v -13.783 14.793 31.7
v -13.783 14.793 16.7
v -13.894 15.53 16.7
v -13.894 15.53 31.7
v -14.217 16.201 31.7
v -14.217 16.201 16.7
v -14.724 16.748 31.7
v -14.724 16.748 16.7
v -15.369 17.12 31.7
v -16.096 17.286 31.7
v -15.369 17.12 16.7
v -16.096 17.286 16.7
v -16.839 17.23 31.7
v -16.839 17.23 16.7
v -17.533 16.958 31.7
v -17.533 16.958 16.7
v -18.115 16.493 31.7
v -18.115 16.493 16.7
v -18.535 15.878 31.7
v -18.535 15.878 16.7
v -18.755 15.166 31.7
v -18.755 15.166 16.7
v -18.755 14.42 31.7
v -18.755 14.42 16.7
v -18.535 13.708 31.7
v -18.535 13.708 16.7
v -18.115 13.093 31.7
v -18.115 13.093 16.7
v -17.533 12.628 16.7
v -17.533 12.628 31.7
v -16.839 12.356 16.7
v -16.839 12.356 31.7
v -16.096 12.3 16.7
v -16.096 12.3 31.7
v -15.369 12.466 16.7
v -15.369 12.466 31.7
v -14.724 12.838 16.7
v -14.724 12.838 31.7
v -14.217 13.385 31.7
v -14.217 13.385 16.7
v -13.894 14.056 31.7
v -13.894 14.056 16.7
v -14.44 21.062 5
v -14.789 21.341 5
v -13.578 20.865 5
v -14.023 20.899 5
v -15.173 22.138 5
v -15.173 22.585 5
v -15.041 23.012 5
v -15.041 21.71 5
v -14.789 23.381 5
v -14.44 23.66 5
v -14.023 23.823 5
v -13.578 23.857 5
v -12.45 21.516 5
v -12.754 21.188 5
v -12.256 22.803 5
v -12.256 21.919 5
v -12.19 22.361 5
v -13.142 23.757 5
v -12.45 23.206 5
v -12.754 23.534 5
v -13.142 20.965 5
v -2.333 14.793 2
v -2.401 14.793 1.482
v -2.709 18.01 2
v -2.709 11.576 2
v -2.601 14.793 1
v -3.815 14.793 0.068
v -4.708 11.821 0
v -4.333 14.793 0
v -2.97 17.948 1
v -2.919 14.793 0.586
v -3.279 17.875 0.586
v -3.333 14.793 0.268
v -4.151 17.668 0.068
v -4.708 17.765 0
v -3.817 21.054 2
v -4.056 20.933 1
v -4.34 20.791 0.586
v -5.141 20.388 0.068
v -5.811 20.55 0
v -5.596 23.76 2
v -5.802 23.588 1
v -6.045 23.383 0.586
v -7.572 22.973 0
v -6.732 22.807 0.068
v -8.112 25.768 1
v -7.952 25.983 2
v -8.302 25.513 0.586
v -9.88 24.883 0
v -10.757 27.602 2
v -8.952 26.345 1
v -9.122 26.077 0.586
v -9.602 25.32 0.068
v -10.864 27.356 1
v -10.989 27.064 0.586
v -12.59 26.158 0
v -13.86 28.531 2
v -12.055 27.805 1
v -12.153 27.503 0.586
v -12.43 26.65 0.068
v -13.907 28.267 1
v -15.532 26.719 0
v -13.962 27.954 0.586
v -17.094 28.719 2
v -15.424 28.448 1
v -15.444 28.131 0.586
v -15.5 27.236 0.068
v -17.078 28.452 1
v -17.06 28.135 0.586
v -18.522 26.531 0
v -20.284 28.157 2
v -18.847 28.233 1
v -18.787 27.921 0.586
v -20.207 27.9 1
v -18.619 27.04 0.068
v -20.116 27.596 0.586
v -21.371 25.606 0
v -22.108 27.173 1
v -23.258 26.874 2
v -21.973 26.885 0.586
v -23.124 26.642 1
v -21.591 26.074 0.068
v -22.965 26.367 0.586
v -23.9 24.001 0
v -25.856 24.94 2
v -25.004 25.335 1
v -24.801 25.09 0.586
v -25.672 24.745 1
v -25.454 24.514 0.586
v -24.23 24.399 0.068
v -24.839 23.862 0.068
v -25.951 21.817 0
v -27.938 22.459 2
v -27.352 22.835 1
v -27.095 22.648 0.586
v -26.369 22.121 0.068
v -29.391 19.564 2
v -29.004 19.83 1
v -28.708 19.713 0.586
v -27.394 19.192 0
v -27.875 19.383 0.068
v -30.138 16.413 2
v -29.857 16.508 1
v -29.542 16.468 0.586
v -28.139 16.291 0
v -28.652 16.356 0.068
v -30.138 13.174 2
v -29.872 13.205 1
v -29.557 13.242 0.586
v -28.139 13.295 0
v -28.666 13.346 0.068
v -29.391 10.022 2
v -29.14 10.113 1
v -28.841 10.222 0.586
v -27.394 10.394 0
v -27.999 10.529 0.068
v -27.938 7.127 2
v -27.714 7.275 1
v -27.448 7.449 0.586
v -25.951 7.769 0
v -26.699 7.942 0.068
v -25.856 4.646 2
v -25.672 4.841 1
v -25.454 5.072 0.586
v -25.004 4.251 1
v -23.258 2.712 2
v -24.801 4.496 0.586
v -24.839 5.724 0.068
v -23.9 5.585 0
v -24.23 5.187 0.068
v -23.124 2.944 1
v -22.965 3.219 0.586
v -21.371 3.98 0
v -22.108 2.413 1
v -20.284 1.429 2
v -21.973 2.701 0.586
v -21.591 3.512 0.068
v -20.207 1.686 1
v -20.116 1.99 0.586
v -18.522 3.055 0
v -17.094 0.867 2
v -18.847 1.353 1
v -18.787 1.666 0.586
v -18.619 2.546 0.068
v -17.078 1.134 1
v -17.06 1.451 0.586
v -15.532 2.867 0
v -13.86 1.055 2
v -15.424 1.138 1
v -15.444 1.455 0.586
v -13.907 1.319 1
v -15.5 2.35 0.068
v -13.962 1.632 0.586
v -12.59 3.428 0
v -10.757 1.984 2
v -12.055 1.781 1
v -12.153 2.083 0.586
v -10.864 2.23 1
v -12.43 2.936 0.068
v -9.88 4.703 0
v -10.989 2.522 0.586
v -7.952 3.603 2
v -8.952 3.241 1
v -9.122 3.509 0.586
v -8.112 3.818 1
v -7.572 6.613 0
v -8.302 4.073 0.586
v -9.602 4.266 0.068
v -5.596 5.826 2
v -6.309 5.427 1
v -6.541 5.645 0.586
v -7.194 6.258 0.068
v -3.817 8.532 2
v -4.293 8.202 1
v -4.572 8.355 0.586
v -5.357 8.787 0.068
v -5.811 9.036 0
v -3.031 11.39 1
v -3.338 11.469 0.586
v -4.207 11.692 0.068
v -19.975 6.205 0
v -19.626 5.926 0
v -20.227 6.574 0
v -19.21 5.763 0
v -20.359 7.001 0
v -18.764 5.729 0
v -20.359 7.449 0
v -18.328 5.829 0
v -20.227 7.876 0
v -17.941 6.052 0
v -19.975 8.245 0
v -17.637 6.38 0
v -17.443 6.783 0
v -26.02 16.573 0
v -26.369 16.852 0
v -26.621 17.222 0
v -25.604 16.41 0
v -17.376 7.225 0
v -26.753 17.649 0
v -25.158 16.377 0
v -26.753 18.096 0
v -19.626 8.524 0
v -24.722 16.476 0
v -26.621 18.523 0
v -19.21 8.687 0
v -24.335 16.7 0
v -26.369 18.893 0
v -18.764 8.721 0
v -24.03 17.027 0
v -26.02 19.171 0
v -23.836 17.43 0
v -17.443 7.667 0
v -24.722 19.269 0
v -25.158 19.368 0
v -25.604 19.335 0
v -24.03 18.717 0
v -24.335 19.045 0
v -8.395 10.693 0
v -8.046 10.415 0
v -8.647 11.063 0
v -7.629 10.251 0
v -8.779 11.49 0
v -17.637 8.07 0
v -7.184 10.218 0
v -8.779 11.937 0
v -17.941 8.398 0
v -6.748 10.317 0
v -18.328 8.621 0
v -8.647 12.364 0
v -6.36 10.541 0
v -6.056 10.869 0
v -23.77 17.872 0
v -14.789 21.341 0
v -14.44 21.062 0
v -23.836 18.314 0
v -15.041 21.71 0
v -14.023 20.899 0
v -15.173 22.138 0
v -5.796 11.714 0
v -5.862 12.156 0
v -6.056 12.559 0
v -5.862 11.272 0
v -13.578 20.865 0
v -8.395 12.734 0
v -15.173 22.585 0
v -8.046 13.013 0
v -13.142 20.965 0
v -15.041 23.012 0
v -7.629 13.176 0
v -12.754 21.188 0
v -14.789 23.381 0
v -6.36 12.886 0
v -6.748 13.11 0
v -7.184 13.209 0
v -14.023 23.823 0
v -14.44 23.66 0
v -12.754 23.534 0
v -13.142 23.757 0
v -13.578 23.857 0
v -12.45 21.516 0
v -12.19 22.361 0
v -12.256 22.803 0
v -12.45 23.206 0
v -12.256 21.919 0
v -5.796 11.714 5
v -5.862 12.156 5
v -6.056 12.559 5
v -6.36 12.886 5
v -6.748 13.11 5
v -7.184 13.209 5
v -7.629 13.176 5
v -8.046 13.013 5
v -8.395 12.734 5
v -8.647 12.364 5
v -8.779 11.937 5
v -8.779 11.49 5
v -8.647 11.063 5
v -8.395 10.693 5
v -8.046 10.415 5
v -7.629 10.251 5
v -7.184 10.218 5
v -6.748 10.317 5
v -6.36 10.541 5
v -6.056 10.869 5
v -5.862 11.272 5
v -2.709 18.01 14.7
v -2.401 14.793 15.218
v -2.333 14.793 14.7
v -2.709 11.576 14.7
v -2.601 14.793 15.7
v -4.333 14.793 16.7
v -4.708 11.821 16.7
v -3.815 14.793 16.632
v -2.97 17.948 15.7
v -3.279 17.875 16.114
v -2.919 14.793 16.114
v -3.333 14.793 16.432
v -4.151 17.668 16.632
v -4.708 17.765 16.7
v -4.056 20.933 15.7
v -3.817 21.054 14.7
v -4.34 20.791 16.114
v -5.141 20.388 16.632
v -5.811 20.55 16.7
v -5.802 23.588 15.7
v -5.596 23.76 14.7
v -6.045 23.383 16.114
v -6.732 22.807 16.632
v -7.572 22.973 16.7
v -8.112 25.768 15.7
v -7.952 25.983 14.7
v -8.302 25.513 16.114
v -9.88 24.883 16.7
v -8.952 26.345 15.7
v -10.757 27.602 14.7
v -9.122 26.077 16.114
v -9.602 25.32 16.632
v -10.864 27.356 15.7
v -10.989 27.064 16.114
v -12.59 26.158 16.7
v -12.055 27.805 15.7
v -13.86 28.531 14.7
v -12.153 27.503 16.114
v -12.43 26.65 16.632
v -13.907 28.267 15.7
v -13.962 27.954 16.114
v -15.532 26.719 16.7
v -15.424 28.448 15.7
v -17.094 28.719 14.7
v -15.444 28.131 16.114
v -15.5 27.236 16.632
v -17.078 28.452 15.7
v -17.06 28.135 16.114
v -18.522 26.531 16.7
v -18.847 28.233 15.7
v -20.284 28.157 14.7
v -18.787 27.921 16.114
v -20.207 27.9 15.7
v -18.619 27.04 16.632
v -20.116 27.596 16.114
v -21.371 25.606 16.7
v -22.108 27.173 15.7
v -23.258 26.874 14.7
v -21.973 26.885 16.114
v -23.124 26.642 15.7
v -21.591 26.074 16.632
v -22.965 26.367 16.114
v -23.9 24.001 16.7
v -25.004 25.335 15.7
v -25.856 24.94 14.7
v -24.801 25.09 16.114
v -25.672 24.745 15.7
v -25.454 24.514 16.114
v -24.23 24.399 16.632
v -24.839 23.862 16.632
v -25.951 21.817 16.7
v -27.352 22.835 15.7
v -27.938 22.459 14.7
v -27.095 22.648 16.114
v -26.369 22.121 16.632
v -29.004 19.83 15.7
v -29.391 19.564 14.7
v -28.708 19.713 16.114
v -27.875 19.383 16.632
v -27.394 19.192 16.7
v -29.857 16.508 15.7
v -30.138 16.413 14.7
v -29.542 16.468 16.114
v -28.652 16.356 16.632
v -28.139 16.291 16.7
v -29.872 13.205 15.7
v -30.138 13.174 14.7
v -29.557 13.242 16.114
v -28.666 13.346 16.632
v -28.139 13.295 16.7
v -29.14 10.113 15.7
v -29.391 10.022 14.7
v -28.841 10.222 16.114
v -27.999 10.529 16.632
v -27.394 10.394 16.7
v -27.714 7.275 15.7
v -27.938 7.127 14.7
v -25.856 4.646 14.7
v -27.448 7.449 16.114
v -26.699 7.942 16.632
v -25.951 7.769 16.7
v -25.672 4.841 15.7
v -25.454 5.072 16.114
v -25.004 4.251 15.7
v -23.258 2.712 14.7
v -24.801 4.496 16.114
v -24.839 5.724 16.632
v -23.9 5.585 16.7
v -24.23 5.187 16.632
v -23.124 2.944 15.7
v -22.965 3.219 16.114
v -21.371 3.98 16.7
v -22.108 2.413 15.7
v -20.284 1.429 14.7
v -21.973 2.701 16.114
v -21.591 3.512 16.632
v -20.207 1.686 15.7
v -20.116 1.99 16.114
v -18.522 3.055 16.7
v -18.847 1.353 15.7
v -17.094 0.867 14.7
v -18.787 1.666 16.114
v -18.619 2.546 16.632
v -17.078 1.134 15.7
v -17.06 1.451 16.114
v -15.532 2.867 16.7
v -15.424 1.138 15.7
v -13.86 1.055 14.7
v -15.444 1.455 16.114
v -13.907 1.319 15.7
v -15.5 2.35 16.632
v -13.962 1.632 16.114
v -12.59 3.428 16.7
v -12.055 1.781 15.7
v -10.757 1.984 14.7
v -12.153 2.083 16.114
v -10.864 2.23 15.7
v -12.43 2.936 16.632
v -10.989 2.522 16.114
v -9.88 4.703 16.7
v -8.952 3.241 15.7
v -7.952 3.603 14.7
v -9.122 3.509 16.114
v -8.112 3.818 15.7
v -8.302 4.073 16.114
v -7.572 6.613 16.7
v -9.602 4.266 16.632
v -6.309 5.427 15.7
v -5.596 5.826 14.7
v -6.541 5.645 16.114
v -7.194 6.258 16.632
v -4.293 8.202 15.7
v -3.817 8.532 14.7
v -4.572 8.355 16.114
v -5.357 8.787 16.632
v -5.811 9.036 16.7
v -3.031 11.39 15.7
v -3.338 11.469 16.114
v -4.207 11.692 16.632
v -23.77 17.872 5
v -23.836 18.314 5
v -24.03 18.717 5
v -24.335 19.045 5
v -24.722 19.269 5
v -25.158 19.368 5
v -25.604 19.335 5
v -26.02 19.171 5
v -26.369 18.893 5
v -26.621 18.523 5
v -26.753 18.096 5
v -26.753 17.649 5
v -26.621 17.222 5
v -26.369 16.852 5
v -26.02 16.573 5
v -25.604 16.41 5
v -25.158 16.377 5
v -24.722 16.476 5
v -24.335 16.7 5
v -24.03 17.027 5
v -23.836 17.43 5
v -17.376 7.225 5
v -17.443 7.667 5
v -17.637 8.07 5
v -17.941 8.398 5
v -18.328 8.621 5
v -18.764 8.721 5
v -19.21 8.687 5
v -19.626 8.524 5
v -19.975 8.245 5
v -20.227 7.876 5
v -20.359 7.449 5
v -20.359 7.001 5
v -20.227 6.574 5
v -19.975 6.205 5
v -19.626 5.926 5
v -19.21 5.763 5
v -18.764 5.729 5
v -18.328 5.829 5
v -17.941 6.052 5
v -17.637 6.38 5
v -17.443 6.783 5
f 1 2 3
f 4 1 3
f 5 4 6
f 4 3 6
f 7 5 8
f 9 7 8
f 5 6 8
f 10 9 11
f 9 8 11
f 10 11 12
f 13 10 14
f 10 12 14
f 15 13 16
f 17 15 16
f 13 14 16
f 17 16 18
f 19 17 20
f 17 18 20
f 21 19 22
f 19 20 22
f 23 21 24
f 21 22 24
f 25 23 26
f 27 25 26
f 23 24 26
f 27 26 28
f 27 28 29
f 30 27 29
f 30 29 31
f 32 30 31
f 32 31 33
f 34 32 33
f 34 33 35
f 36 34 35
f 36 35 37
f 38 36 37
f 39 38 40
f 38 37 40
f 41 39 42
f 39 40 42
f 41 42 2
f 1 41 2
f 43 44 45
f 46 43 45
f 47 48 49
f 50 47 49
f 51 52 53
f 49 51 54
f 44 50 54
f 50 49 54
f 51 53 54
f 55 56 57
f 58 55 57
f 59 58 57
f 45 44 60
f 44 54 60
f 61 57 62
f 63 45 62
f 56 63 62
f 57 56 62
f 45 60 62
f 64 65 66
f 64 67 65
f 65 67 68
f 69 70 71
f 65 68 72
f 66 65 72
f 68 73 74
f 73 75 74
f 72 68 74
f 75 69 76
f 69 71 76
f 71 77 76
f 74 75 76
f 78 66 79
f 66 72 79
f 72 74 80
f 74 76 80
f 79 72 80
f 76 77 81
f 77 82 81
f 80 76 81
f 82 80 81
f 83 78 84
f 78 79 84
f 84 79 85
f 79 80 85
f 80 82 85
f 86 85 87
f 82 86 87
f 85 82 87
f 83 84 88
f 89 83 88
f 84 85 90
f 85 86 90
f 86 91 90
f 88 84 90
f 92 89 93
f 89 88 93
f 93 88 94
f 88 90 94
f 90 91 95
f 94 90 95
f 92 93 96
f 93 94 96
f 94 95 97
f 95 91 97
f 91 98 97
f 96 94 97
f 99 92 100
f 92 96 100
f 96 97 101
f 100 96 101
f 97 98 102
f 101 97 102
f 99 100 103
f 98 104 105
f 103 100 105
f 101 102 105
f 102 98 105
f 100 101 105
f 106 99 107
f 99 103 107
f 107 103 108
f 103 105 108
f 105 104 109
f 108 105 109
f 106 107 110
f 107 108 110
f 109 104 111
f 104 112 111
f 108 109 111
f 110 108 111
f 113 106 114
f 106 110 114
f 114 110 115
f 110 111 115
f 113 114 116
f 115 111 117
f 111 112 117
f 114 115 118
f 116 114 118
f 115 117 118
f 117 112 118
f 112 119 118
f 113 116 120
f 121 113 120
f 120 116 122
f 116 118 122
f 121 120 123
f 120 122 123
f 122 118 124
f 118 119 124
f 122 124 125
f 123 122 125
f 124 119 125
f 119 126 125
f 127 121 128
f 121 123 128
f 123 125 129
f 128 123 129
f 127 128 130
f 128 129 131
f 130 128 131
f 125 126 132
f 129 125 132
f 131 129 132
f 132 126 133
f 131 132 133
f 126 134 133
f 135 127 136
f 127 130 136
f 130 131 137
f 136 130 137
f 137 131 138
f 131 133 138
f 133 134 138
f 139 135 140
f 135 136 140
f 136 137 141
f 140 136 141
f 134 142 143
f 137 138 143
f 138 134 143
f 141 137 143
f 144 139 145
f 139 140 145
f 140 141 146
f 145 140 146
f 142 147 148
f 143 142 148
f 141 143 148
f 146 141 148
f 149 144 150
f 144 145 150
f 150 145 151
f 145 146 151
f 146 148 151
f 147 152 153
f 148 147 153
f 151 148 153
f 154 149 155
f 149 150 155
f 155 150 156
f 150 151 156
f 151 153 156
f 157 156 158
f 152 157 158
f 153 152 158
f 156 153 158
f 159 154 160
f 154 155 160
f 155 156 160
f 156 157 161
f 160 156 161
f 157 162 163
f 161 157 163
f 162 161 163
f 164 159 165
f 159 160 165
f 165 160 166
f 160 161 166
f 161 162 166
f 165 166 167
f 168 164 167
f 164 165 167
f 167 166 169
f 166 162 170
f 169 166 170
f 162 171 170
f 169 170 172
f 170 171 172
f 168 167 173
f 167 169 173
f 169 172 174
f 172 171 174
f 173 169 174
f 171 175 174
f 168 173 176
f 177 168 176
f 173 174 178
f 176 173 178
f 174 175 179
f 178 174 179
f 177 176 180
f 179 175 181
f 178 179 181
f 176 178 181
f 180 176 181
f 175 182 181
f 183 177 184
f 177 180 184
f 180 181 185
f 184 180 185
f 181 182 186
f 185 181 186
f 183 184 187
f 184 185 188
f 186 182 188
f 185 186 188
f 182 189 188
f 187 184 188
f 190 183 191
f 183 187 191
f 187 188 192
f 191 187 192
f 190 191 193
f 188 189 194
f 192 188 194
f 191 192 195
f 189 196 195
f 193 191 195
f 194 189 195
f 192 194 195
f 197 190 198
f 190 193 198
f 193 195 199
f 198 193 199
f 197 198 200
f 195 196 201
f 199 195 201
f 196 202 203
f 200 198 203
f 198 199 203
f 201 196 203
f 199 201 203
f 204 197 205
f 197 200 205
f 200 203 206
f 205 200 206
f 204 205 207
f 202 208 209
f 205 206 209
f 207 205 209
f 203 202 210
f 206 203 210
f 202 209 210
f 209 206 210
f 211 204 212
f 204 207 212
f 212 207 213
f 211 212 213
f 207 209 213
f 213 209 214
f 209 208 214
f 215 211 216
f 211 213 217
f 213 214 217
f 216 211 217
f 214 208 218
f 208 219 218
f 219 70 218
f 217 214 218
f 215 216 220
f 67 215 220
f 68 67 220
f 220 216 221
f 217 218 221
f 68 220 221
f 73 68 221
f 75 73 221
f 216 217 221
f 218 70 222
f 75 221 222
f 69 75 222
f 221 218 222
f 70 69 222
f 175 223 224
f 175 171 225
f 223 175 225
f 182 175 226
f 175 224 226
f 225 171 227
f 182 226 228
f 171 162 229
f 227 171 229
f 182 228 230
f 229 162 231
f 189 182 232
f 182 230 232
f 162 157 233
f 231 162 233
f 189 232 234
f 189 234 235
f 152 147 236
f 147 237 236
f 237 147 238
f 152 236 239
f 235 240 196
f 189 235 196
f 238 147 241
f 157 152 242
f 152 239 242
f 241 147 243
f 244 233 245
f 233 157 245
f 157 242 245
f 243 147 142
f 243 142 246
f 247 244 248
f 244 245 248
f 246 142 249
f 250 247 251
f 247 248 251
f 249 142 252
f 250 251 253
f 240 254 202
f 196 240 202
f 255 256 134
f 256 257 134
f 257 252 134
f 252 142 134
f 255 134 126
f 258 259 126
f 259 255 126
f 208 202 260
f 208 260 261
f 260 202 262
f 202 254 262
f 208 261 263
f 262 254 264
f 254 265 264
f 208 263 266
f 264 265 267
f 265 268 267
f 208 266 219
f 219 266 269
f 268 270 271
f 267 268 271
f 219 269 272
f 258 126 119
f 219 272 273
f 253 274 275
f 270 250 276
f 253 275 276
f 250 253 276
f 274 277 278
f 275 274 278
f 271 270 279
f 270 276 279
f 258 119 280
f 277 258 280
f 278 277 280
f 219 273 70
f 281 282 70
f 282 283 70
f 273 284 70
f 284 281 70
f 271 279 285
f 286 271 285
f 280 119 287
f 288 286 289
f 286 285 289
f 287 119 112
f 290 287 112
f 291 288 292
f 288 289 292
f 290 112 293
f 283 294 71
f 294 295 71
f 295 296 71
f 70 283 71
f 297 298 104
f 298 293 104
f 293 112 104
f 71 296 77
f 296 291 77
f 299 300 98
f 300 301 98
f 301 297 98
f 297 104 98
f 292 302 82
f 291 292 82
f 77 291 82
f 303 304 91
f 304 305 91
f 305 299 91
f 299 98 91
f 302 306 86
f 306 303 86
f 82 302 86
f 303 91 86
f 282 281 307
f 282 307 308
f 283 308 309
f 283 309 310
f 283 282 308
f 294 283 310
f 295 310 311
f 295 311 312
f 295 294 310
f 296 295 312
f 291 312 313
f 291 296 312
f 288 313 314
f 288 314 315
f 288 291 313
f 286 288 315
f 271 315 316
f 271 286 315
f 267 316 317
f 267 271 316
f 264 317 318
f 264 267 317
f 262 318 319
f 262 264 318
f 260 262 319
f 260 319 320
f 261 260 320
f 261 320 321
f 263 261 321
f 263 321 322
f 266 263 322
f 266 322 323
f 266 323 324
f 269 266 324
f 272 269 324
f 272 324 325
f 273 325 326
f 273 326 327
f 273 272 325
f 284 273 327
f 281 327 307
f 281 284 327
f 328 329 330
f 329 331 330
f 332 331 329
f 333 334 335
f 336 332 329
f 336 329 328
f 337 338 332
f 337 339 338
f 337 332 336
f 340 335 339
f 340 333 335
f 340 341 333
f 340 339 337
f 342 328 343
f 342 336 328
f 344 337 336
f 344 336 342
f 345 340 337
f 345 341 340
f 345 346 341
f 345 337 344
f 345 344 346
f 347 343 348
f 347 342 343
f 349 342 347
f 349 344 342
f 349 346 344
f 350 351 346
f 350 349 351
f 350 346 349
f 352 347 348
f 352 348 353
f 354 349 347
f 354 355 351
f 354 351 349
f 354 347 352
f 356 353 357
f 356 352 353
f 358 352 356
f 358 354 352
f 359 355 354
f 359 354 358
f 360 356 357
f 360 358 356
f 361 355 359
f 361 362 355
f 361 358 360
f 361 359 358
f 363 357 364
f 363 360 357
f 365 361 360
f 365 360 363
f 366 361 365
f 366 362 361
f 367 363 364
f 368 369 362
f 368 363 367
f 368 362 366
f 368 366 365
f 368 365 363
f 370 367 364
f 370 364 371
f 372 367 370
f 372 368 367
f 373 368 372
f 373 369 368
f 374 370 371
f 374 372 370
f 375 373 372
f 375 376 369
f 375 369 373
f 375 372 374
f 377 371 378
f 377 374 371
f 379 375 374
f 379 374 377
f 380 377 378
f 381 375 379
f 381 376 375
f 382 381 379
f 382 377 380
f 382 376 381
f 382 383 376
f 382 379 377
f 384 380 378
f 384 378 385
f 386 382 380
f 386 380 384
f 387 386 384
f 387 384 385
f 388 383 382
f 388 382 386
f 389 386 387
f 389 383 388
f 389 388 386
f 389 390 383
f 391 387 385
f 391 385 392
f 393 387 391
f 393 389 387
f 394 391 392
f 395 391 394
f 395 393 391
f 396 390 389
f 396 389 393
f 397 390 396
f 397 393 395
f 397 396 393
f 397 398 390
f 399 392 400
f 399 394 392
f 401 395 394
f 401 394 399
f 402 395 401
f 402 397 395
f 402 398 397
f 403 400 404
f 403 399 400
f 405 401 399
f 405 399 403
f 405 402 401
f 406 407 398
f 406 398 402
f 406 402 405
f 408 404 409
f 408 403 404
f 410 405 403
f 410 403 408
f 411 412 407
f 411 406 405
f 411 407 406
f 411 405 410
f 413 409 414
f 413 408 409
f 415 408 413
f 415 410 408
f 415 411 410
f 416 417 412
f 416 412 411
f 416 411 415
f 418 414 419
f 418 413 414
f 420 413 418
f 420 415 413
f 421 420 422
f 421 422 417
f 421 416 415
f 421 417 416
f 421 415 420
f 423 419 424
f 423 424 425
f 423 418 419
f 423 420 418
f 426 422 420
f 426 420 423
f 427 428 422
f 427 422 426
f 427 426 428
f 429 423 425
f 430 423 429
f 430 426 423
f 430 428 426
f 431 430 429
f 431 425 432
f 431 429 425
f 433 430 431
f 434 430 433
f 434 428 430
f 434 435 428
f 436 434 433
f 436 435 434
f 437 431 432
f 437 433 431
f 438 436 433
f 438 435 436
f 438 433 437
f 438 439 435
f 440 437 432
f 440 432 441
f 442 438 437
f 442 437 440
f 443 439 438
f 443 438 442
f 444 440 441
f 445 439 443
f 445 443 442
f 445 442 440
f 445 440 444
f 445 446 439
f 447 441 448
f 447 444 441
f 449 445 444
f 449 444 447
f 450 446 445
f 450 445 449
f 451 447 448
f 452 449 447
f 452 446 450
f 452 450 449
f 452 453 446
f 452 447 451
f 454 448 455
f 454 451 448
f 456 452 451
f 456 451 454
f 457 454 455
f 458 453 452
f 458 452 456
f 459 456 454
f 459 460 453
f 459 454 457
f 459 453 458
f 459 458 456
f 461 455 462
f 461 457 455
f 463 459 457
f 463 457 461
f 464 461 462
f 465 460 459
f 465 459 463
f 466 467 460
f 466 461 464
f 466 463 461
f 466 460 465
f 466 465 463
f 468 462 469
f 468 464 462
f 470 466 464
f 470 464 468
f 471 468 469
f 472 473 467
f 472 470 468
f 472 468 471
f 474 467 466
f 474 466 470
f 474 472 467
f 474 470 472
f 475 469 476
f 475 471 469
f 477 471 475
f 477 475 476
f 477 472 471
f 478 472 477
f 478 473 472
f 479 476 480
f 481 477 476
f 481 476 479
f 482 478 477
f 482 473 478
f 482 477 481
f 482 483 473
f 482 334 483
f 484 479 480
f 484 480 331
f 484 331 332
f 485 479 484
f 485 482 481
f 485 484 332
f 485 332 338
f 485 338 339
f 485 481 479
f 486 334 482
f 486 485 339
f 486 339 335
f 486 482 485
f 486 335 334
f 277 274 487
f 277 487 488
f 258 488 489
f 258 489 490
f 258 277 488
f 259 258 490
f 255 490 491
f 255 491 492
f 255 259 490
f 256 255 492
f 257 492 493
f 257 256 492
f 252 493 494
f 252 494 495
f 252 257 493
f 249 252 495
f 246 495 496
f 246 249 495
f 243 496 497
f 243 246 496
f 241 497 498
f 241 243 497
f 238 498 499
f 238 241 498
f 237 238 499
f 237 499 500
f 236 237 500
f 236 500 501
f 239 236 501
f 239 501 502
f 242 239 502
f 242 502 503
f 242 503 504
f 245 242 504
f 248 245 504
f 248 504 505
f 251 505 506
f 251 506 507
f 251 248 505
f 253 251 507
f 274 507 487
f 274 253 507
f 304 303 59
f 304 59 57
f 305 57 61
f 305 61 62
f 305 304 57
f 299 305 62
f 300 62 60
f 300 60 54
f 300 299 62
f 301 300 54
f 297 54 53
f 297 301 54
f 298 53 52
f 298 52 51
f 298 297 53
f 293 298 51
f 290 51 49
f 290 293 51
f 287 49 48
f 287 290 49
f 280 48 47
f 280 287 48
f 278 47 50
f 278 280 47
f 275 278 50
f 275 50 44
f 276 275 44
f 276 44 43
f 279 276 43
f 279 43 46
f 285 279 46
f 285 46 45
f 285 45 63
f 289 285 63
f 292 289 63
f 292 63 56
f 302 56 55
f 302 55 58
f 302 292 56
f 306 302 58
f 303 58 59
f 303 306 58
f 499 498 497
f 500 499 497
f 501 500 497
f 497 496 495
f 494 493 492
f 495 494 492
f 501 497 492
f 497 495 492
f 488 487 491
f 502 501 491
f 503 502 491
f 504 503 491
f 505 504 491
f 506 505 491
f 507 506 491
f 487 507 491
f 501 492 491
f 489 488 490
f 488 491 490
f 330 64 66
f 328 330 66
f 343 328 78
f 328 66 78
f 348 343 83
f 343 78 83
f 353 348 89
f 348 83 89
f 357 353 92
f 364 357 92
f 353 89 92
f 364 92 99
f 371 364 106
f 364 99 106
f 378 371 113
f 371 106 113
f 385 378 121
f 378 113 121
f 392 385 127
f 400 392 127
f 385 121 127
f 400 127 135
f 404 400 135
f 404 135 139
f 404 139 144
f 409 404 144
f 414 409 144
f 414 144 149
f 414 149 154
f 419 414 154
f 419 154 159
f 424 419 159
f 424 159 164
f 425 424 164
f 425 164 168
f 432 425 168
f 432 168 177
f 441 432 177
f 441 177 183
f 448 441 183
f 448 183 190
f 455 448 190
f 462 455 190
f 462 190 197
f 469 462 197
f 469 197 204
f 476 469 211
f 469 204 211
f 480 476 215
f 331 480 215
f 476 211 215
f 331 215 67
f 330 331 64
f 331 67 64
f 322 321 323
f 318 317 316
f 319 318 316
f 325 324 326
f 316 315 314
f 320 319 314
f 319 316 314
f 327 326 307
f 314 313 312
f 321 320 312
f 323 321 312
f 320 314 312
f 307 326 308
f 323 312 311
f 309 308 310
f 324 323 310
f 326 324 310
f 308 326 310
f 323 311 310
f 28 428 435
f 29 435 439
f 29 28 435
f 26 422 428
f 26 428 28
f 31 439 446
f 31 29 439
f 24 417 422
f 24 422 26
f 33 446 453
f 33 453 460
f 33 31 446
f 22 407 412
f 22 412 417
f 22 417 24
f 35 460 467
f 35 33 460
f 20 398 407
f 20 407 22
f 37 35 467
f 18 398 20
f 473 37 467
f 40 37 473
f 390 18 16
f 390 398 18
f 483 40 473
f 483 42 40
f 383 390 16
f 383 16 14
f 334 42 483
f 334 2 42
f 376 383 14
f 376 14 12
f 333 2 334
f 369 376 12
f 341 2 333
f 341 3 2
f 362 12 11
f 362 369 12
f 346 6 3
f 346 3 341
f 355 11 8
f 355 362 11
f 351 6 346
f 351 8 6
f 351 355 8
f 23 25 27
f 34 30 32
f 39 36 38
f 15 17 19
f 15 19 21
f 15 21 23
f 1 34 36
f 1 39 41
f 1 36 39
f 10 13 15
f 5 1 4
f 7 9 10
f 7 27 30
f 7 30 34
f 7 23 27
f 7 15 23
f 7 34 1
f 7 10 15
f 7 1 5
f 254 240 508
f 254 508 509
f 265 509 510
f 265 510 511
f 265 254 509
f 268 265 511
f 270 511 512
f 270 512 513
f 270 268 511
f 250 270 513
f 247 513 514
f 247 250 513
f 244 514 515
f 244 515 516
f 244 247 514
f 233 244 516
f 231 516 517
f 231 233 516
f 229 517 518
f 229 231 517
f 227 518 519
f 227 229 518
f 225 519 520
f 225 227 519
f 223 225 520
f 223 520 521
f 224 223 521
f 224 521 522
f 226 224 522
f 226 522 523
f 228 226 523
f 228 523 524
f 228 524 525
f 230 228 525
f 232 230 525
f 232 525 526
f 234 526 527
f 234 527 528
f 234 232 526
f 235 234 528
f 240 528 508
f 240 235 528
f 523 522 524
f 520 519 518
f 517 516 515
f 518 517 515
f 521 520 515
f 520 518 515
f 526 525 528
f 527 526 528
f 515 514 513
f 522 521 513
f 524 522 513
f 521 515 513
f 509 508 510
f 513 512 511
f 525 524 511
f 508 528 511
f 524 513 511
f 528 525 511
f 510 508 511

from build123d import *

# Parameters (mm, degrees)
SKETCH_R     = 13.95
SKETCH_R_2   = 1.5
PAD_DEPTH    = 5
SKETCH001_R  = 13.95
PAD001_DEPTH = 11.7
SKETCH002_R  = 2.5
PAD002_DEPTH = 15
FILLET_R     = 2
FILLET001_R  = 2


with BuildPart() as part:
    # Sketch → Pad (new body)
    with BuildSketch(Plane.XY):
        with Locations((-16.282767, 14.793005)):
            Circle(SKETCH_R)
        with Locations((-25.269844, 17.872364)):
            Circle(SKETCH_R_2, mode=Mode.SUBTRACT)
        with Locations((-18.875912, 7.22494)):
            Circle(SKETCH_R_2, mode=Mode.SUBTRACT)
        with Locations((-7.295691, 11.713645)):
            Circle(SKETCH_R_2, mode=Mode.SUBTRACT)
        with Locations((-13.689622, 22.361069)):
            Circle(SKETCH_R_2, mode=Mode.SUBTRACT)
    extrude(amount=PAD_DEPTH)

    # Sketch001 → Pad001 (new body)
    with BuildSketch(Plane.XY.offset(5)):
        with Locations((-16.282767, 14.793005)):
            Circle(SKETCH001_R)
    extrude(amount=PAD001_DEPTH)

    # Sketch002 → Pad002 (new body)
    with BuildSketch(Plane.XY.offset(16.7)):
        with Locations((-16.282767, 14.793005)):
            Circle(SKETCH002_R)
    extrude(amount=PAD002_DEPTH)

    # Fillet
    fillet_edges = [part.edges().sort_by_distance(p)[0] for p in [
        (-30.232767, 14.793005, 16.7),
    ]]
    fillet(fillet_edges, radius=FILLET_R)

    # Fillet001
    fillet001_edges = [part.edges().sort_by_distance(p)[0] for p in [
        (-30.232767, 14.793005, 0),
    ]]
    fillet(fillet001_edges, radius=FILLET001_R)


solid = part.part
